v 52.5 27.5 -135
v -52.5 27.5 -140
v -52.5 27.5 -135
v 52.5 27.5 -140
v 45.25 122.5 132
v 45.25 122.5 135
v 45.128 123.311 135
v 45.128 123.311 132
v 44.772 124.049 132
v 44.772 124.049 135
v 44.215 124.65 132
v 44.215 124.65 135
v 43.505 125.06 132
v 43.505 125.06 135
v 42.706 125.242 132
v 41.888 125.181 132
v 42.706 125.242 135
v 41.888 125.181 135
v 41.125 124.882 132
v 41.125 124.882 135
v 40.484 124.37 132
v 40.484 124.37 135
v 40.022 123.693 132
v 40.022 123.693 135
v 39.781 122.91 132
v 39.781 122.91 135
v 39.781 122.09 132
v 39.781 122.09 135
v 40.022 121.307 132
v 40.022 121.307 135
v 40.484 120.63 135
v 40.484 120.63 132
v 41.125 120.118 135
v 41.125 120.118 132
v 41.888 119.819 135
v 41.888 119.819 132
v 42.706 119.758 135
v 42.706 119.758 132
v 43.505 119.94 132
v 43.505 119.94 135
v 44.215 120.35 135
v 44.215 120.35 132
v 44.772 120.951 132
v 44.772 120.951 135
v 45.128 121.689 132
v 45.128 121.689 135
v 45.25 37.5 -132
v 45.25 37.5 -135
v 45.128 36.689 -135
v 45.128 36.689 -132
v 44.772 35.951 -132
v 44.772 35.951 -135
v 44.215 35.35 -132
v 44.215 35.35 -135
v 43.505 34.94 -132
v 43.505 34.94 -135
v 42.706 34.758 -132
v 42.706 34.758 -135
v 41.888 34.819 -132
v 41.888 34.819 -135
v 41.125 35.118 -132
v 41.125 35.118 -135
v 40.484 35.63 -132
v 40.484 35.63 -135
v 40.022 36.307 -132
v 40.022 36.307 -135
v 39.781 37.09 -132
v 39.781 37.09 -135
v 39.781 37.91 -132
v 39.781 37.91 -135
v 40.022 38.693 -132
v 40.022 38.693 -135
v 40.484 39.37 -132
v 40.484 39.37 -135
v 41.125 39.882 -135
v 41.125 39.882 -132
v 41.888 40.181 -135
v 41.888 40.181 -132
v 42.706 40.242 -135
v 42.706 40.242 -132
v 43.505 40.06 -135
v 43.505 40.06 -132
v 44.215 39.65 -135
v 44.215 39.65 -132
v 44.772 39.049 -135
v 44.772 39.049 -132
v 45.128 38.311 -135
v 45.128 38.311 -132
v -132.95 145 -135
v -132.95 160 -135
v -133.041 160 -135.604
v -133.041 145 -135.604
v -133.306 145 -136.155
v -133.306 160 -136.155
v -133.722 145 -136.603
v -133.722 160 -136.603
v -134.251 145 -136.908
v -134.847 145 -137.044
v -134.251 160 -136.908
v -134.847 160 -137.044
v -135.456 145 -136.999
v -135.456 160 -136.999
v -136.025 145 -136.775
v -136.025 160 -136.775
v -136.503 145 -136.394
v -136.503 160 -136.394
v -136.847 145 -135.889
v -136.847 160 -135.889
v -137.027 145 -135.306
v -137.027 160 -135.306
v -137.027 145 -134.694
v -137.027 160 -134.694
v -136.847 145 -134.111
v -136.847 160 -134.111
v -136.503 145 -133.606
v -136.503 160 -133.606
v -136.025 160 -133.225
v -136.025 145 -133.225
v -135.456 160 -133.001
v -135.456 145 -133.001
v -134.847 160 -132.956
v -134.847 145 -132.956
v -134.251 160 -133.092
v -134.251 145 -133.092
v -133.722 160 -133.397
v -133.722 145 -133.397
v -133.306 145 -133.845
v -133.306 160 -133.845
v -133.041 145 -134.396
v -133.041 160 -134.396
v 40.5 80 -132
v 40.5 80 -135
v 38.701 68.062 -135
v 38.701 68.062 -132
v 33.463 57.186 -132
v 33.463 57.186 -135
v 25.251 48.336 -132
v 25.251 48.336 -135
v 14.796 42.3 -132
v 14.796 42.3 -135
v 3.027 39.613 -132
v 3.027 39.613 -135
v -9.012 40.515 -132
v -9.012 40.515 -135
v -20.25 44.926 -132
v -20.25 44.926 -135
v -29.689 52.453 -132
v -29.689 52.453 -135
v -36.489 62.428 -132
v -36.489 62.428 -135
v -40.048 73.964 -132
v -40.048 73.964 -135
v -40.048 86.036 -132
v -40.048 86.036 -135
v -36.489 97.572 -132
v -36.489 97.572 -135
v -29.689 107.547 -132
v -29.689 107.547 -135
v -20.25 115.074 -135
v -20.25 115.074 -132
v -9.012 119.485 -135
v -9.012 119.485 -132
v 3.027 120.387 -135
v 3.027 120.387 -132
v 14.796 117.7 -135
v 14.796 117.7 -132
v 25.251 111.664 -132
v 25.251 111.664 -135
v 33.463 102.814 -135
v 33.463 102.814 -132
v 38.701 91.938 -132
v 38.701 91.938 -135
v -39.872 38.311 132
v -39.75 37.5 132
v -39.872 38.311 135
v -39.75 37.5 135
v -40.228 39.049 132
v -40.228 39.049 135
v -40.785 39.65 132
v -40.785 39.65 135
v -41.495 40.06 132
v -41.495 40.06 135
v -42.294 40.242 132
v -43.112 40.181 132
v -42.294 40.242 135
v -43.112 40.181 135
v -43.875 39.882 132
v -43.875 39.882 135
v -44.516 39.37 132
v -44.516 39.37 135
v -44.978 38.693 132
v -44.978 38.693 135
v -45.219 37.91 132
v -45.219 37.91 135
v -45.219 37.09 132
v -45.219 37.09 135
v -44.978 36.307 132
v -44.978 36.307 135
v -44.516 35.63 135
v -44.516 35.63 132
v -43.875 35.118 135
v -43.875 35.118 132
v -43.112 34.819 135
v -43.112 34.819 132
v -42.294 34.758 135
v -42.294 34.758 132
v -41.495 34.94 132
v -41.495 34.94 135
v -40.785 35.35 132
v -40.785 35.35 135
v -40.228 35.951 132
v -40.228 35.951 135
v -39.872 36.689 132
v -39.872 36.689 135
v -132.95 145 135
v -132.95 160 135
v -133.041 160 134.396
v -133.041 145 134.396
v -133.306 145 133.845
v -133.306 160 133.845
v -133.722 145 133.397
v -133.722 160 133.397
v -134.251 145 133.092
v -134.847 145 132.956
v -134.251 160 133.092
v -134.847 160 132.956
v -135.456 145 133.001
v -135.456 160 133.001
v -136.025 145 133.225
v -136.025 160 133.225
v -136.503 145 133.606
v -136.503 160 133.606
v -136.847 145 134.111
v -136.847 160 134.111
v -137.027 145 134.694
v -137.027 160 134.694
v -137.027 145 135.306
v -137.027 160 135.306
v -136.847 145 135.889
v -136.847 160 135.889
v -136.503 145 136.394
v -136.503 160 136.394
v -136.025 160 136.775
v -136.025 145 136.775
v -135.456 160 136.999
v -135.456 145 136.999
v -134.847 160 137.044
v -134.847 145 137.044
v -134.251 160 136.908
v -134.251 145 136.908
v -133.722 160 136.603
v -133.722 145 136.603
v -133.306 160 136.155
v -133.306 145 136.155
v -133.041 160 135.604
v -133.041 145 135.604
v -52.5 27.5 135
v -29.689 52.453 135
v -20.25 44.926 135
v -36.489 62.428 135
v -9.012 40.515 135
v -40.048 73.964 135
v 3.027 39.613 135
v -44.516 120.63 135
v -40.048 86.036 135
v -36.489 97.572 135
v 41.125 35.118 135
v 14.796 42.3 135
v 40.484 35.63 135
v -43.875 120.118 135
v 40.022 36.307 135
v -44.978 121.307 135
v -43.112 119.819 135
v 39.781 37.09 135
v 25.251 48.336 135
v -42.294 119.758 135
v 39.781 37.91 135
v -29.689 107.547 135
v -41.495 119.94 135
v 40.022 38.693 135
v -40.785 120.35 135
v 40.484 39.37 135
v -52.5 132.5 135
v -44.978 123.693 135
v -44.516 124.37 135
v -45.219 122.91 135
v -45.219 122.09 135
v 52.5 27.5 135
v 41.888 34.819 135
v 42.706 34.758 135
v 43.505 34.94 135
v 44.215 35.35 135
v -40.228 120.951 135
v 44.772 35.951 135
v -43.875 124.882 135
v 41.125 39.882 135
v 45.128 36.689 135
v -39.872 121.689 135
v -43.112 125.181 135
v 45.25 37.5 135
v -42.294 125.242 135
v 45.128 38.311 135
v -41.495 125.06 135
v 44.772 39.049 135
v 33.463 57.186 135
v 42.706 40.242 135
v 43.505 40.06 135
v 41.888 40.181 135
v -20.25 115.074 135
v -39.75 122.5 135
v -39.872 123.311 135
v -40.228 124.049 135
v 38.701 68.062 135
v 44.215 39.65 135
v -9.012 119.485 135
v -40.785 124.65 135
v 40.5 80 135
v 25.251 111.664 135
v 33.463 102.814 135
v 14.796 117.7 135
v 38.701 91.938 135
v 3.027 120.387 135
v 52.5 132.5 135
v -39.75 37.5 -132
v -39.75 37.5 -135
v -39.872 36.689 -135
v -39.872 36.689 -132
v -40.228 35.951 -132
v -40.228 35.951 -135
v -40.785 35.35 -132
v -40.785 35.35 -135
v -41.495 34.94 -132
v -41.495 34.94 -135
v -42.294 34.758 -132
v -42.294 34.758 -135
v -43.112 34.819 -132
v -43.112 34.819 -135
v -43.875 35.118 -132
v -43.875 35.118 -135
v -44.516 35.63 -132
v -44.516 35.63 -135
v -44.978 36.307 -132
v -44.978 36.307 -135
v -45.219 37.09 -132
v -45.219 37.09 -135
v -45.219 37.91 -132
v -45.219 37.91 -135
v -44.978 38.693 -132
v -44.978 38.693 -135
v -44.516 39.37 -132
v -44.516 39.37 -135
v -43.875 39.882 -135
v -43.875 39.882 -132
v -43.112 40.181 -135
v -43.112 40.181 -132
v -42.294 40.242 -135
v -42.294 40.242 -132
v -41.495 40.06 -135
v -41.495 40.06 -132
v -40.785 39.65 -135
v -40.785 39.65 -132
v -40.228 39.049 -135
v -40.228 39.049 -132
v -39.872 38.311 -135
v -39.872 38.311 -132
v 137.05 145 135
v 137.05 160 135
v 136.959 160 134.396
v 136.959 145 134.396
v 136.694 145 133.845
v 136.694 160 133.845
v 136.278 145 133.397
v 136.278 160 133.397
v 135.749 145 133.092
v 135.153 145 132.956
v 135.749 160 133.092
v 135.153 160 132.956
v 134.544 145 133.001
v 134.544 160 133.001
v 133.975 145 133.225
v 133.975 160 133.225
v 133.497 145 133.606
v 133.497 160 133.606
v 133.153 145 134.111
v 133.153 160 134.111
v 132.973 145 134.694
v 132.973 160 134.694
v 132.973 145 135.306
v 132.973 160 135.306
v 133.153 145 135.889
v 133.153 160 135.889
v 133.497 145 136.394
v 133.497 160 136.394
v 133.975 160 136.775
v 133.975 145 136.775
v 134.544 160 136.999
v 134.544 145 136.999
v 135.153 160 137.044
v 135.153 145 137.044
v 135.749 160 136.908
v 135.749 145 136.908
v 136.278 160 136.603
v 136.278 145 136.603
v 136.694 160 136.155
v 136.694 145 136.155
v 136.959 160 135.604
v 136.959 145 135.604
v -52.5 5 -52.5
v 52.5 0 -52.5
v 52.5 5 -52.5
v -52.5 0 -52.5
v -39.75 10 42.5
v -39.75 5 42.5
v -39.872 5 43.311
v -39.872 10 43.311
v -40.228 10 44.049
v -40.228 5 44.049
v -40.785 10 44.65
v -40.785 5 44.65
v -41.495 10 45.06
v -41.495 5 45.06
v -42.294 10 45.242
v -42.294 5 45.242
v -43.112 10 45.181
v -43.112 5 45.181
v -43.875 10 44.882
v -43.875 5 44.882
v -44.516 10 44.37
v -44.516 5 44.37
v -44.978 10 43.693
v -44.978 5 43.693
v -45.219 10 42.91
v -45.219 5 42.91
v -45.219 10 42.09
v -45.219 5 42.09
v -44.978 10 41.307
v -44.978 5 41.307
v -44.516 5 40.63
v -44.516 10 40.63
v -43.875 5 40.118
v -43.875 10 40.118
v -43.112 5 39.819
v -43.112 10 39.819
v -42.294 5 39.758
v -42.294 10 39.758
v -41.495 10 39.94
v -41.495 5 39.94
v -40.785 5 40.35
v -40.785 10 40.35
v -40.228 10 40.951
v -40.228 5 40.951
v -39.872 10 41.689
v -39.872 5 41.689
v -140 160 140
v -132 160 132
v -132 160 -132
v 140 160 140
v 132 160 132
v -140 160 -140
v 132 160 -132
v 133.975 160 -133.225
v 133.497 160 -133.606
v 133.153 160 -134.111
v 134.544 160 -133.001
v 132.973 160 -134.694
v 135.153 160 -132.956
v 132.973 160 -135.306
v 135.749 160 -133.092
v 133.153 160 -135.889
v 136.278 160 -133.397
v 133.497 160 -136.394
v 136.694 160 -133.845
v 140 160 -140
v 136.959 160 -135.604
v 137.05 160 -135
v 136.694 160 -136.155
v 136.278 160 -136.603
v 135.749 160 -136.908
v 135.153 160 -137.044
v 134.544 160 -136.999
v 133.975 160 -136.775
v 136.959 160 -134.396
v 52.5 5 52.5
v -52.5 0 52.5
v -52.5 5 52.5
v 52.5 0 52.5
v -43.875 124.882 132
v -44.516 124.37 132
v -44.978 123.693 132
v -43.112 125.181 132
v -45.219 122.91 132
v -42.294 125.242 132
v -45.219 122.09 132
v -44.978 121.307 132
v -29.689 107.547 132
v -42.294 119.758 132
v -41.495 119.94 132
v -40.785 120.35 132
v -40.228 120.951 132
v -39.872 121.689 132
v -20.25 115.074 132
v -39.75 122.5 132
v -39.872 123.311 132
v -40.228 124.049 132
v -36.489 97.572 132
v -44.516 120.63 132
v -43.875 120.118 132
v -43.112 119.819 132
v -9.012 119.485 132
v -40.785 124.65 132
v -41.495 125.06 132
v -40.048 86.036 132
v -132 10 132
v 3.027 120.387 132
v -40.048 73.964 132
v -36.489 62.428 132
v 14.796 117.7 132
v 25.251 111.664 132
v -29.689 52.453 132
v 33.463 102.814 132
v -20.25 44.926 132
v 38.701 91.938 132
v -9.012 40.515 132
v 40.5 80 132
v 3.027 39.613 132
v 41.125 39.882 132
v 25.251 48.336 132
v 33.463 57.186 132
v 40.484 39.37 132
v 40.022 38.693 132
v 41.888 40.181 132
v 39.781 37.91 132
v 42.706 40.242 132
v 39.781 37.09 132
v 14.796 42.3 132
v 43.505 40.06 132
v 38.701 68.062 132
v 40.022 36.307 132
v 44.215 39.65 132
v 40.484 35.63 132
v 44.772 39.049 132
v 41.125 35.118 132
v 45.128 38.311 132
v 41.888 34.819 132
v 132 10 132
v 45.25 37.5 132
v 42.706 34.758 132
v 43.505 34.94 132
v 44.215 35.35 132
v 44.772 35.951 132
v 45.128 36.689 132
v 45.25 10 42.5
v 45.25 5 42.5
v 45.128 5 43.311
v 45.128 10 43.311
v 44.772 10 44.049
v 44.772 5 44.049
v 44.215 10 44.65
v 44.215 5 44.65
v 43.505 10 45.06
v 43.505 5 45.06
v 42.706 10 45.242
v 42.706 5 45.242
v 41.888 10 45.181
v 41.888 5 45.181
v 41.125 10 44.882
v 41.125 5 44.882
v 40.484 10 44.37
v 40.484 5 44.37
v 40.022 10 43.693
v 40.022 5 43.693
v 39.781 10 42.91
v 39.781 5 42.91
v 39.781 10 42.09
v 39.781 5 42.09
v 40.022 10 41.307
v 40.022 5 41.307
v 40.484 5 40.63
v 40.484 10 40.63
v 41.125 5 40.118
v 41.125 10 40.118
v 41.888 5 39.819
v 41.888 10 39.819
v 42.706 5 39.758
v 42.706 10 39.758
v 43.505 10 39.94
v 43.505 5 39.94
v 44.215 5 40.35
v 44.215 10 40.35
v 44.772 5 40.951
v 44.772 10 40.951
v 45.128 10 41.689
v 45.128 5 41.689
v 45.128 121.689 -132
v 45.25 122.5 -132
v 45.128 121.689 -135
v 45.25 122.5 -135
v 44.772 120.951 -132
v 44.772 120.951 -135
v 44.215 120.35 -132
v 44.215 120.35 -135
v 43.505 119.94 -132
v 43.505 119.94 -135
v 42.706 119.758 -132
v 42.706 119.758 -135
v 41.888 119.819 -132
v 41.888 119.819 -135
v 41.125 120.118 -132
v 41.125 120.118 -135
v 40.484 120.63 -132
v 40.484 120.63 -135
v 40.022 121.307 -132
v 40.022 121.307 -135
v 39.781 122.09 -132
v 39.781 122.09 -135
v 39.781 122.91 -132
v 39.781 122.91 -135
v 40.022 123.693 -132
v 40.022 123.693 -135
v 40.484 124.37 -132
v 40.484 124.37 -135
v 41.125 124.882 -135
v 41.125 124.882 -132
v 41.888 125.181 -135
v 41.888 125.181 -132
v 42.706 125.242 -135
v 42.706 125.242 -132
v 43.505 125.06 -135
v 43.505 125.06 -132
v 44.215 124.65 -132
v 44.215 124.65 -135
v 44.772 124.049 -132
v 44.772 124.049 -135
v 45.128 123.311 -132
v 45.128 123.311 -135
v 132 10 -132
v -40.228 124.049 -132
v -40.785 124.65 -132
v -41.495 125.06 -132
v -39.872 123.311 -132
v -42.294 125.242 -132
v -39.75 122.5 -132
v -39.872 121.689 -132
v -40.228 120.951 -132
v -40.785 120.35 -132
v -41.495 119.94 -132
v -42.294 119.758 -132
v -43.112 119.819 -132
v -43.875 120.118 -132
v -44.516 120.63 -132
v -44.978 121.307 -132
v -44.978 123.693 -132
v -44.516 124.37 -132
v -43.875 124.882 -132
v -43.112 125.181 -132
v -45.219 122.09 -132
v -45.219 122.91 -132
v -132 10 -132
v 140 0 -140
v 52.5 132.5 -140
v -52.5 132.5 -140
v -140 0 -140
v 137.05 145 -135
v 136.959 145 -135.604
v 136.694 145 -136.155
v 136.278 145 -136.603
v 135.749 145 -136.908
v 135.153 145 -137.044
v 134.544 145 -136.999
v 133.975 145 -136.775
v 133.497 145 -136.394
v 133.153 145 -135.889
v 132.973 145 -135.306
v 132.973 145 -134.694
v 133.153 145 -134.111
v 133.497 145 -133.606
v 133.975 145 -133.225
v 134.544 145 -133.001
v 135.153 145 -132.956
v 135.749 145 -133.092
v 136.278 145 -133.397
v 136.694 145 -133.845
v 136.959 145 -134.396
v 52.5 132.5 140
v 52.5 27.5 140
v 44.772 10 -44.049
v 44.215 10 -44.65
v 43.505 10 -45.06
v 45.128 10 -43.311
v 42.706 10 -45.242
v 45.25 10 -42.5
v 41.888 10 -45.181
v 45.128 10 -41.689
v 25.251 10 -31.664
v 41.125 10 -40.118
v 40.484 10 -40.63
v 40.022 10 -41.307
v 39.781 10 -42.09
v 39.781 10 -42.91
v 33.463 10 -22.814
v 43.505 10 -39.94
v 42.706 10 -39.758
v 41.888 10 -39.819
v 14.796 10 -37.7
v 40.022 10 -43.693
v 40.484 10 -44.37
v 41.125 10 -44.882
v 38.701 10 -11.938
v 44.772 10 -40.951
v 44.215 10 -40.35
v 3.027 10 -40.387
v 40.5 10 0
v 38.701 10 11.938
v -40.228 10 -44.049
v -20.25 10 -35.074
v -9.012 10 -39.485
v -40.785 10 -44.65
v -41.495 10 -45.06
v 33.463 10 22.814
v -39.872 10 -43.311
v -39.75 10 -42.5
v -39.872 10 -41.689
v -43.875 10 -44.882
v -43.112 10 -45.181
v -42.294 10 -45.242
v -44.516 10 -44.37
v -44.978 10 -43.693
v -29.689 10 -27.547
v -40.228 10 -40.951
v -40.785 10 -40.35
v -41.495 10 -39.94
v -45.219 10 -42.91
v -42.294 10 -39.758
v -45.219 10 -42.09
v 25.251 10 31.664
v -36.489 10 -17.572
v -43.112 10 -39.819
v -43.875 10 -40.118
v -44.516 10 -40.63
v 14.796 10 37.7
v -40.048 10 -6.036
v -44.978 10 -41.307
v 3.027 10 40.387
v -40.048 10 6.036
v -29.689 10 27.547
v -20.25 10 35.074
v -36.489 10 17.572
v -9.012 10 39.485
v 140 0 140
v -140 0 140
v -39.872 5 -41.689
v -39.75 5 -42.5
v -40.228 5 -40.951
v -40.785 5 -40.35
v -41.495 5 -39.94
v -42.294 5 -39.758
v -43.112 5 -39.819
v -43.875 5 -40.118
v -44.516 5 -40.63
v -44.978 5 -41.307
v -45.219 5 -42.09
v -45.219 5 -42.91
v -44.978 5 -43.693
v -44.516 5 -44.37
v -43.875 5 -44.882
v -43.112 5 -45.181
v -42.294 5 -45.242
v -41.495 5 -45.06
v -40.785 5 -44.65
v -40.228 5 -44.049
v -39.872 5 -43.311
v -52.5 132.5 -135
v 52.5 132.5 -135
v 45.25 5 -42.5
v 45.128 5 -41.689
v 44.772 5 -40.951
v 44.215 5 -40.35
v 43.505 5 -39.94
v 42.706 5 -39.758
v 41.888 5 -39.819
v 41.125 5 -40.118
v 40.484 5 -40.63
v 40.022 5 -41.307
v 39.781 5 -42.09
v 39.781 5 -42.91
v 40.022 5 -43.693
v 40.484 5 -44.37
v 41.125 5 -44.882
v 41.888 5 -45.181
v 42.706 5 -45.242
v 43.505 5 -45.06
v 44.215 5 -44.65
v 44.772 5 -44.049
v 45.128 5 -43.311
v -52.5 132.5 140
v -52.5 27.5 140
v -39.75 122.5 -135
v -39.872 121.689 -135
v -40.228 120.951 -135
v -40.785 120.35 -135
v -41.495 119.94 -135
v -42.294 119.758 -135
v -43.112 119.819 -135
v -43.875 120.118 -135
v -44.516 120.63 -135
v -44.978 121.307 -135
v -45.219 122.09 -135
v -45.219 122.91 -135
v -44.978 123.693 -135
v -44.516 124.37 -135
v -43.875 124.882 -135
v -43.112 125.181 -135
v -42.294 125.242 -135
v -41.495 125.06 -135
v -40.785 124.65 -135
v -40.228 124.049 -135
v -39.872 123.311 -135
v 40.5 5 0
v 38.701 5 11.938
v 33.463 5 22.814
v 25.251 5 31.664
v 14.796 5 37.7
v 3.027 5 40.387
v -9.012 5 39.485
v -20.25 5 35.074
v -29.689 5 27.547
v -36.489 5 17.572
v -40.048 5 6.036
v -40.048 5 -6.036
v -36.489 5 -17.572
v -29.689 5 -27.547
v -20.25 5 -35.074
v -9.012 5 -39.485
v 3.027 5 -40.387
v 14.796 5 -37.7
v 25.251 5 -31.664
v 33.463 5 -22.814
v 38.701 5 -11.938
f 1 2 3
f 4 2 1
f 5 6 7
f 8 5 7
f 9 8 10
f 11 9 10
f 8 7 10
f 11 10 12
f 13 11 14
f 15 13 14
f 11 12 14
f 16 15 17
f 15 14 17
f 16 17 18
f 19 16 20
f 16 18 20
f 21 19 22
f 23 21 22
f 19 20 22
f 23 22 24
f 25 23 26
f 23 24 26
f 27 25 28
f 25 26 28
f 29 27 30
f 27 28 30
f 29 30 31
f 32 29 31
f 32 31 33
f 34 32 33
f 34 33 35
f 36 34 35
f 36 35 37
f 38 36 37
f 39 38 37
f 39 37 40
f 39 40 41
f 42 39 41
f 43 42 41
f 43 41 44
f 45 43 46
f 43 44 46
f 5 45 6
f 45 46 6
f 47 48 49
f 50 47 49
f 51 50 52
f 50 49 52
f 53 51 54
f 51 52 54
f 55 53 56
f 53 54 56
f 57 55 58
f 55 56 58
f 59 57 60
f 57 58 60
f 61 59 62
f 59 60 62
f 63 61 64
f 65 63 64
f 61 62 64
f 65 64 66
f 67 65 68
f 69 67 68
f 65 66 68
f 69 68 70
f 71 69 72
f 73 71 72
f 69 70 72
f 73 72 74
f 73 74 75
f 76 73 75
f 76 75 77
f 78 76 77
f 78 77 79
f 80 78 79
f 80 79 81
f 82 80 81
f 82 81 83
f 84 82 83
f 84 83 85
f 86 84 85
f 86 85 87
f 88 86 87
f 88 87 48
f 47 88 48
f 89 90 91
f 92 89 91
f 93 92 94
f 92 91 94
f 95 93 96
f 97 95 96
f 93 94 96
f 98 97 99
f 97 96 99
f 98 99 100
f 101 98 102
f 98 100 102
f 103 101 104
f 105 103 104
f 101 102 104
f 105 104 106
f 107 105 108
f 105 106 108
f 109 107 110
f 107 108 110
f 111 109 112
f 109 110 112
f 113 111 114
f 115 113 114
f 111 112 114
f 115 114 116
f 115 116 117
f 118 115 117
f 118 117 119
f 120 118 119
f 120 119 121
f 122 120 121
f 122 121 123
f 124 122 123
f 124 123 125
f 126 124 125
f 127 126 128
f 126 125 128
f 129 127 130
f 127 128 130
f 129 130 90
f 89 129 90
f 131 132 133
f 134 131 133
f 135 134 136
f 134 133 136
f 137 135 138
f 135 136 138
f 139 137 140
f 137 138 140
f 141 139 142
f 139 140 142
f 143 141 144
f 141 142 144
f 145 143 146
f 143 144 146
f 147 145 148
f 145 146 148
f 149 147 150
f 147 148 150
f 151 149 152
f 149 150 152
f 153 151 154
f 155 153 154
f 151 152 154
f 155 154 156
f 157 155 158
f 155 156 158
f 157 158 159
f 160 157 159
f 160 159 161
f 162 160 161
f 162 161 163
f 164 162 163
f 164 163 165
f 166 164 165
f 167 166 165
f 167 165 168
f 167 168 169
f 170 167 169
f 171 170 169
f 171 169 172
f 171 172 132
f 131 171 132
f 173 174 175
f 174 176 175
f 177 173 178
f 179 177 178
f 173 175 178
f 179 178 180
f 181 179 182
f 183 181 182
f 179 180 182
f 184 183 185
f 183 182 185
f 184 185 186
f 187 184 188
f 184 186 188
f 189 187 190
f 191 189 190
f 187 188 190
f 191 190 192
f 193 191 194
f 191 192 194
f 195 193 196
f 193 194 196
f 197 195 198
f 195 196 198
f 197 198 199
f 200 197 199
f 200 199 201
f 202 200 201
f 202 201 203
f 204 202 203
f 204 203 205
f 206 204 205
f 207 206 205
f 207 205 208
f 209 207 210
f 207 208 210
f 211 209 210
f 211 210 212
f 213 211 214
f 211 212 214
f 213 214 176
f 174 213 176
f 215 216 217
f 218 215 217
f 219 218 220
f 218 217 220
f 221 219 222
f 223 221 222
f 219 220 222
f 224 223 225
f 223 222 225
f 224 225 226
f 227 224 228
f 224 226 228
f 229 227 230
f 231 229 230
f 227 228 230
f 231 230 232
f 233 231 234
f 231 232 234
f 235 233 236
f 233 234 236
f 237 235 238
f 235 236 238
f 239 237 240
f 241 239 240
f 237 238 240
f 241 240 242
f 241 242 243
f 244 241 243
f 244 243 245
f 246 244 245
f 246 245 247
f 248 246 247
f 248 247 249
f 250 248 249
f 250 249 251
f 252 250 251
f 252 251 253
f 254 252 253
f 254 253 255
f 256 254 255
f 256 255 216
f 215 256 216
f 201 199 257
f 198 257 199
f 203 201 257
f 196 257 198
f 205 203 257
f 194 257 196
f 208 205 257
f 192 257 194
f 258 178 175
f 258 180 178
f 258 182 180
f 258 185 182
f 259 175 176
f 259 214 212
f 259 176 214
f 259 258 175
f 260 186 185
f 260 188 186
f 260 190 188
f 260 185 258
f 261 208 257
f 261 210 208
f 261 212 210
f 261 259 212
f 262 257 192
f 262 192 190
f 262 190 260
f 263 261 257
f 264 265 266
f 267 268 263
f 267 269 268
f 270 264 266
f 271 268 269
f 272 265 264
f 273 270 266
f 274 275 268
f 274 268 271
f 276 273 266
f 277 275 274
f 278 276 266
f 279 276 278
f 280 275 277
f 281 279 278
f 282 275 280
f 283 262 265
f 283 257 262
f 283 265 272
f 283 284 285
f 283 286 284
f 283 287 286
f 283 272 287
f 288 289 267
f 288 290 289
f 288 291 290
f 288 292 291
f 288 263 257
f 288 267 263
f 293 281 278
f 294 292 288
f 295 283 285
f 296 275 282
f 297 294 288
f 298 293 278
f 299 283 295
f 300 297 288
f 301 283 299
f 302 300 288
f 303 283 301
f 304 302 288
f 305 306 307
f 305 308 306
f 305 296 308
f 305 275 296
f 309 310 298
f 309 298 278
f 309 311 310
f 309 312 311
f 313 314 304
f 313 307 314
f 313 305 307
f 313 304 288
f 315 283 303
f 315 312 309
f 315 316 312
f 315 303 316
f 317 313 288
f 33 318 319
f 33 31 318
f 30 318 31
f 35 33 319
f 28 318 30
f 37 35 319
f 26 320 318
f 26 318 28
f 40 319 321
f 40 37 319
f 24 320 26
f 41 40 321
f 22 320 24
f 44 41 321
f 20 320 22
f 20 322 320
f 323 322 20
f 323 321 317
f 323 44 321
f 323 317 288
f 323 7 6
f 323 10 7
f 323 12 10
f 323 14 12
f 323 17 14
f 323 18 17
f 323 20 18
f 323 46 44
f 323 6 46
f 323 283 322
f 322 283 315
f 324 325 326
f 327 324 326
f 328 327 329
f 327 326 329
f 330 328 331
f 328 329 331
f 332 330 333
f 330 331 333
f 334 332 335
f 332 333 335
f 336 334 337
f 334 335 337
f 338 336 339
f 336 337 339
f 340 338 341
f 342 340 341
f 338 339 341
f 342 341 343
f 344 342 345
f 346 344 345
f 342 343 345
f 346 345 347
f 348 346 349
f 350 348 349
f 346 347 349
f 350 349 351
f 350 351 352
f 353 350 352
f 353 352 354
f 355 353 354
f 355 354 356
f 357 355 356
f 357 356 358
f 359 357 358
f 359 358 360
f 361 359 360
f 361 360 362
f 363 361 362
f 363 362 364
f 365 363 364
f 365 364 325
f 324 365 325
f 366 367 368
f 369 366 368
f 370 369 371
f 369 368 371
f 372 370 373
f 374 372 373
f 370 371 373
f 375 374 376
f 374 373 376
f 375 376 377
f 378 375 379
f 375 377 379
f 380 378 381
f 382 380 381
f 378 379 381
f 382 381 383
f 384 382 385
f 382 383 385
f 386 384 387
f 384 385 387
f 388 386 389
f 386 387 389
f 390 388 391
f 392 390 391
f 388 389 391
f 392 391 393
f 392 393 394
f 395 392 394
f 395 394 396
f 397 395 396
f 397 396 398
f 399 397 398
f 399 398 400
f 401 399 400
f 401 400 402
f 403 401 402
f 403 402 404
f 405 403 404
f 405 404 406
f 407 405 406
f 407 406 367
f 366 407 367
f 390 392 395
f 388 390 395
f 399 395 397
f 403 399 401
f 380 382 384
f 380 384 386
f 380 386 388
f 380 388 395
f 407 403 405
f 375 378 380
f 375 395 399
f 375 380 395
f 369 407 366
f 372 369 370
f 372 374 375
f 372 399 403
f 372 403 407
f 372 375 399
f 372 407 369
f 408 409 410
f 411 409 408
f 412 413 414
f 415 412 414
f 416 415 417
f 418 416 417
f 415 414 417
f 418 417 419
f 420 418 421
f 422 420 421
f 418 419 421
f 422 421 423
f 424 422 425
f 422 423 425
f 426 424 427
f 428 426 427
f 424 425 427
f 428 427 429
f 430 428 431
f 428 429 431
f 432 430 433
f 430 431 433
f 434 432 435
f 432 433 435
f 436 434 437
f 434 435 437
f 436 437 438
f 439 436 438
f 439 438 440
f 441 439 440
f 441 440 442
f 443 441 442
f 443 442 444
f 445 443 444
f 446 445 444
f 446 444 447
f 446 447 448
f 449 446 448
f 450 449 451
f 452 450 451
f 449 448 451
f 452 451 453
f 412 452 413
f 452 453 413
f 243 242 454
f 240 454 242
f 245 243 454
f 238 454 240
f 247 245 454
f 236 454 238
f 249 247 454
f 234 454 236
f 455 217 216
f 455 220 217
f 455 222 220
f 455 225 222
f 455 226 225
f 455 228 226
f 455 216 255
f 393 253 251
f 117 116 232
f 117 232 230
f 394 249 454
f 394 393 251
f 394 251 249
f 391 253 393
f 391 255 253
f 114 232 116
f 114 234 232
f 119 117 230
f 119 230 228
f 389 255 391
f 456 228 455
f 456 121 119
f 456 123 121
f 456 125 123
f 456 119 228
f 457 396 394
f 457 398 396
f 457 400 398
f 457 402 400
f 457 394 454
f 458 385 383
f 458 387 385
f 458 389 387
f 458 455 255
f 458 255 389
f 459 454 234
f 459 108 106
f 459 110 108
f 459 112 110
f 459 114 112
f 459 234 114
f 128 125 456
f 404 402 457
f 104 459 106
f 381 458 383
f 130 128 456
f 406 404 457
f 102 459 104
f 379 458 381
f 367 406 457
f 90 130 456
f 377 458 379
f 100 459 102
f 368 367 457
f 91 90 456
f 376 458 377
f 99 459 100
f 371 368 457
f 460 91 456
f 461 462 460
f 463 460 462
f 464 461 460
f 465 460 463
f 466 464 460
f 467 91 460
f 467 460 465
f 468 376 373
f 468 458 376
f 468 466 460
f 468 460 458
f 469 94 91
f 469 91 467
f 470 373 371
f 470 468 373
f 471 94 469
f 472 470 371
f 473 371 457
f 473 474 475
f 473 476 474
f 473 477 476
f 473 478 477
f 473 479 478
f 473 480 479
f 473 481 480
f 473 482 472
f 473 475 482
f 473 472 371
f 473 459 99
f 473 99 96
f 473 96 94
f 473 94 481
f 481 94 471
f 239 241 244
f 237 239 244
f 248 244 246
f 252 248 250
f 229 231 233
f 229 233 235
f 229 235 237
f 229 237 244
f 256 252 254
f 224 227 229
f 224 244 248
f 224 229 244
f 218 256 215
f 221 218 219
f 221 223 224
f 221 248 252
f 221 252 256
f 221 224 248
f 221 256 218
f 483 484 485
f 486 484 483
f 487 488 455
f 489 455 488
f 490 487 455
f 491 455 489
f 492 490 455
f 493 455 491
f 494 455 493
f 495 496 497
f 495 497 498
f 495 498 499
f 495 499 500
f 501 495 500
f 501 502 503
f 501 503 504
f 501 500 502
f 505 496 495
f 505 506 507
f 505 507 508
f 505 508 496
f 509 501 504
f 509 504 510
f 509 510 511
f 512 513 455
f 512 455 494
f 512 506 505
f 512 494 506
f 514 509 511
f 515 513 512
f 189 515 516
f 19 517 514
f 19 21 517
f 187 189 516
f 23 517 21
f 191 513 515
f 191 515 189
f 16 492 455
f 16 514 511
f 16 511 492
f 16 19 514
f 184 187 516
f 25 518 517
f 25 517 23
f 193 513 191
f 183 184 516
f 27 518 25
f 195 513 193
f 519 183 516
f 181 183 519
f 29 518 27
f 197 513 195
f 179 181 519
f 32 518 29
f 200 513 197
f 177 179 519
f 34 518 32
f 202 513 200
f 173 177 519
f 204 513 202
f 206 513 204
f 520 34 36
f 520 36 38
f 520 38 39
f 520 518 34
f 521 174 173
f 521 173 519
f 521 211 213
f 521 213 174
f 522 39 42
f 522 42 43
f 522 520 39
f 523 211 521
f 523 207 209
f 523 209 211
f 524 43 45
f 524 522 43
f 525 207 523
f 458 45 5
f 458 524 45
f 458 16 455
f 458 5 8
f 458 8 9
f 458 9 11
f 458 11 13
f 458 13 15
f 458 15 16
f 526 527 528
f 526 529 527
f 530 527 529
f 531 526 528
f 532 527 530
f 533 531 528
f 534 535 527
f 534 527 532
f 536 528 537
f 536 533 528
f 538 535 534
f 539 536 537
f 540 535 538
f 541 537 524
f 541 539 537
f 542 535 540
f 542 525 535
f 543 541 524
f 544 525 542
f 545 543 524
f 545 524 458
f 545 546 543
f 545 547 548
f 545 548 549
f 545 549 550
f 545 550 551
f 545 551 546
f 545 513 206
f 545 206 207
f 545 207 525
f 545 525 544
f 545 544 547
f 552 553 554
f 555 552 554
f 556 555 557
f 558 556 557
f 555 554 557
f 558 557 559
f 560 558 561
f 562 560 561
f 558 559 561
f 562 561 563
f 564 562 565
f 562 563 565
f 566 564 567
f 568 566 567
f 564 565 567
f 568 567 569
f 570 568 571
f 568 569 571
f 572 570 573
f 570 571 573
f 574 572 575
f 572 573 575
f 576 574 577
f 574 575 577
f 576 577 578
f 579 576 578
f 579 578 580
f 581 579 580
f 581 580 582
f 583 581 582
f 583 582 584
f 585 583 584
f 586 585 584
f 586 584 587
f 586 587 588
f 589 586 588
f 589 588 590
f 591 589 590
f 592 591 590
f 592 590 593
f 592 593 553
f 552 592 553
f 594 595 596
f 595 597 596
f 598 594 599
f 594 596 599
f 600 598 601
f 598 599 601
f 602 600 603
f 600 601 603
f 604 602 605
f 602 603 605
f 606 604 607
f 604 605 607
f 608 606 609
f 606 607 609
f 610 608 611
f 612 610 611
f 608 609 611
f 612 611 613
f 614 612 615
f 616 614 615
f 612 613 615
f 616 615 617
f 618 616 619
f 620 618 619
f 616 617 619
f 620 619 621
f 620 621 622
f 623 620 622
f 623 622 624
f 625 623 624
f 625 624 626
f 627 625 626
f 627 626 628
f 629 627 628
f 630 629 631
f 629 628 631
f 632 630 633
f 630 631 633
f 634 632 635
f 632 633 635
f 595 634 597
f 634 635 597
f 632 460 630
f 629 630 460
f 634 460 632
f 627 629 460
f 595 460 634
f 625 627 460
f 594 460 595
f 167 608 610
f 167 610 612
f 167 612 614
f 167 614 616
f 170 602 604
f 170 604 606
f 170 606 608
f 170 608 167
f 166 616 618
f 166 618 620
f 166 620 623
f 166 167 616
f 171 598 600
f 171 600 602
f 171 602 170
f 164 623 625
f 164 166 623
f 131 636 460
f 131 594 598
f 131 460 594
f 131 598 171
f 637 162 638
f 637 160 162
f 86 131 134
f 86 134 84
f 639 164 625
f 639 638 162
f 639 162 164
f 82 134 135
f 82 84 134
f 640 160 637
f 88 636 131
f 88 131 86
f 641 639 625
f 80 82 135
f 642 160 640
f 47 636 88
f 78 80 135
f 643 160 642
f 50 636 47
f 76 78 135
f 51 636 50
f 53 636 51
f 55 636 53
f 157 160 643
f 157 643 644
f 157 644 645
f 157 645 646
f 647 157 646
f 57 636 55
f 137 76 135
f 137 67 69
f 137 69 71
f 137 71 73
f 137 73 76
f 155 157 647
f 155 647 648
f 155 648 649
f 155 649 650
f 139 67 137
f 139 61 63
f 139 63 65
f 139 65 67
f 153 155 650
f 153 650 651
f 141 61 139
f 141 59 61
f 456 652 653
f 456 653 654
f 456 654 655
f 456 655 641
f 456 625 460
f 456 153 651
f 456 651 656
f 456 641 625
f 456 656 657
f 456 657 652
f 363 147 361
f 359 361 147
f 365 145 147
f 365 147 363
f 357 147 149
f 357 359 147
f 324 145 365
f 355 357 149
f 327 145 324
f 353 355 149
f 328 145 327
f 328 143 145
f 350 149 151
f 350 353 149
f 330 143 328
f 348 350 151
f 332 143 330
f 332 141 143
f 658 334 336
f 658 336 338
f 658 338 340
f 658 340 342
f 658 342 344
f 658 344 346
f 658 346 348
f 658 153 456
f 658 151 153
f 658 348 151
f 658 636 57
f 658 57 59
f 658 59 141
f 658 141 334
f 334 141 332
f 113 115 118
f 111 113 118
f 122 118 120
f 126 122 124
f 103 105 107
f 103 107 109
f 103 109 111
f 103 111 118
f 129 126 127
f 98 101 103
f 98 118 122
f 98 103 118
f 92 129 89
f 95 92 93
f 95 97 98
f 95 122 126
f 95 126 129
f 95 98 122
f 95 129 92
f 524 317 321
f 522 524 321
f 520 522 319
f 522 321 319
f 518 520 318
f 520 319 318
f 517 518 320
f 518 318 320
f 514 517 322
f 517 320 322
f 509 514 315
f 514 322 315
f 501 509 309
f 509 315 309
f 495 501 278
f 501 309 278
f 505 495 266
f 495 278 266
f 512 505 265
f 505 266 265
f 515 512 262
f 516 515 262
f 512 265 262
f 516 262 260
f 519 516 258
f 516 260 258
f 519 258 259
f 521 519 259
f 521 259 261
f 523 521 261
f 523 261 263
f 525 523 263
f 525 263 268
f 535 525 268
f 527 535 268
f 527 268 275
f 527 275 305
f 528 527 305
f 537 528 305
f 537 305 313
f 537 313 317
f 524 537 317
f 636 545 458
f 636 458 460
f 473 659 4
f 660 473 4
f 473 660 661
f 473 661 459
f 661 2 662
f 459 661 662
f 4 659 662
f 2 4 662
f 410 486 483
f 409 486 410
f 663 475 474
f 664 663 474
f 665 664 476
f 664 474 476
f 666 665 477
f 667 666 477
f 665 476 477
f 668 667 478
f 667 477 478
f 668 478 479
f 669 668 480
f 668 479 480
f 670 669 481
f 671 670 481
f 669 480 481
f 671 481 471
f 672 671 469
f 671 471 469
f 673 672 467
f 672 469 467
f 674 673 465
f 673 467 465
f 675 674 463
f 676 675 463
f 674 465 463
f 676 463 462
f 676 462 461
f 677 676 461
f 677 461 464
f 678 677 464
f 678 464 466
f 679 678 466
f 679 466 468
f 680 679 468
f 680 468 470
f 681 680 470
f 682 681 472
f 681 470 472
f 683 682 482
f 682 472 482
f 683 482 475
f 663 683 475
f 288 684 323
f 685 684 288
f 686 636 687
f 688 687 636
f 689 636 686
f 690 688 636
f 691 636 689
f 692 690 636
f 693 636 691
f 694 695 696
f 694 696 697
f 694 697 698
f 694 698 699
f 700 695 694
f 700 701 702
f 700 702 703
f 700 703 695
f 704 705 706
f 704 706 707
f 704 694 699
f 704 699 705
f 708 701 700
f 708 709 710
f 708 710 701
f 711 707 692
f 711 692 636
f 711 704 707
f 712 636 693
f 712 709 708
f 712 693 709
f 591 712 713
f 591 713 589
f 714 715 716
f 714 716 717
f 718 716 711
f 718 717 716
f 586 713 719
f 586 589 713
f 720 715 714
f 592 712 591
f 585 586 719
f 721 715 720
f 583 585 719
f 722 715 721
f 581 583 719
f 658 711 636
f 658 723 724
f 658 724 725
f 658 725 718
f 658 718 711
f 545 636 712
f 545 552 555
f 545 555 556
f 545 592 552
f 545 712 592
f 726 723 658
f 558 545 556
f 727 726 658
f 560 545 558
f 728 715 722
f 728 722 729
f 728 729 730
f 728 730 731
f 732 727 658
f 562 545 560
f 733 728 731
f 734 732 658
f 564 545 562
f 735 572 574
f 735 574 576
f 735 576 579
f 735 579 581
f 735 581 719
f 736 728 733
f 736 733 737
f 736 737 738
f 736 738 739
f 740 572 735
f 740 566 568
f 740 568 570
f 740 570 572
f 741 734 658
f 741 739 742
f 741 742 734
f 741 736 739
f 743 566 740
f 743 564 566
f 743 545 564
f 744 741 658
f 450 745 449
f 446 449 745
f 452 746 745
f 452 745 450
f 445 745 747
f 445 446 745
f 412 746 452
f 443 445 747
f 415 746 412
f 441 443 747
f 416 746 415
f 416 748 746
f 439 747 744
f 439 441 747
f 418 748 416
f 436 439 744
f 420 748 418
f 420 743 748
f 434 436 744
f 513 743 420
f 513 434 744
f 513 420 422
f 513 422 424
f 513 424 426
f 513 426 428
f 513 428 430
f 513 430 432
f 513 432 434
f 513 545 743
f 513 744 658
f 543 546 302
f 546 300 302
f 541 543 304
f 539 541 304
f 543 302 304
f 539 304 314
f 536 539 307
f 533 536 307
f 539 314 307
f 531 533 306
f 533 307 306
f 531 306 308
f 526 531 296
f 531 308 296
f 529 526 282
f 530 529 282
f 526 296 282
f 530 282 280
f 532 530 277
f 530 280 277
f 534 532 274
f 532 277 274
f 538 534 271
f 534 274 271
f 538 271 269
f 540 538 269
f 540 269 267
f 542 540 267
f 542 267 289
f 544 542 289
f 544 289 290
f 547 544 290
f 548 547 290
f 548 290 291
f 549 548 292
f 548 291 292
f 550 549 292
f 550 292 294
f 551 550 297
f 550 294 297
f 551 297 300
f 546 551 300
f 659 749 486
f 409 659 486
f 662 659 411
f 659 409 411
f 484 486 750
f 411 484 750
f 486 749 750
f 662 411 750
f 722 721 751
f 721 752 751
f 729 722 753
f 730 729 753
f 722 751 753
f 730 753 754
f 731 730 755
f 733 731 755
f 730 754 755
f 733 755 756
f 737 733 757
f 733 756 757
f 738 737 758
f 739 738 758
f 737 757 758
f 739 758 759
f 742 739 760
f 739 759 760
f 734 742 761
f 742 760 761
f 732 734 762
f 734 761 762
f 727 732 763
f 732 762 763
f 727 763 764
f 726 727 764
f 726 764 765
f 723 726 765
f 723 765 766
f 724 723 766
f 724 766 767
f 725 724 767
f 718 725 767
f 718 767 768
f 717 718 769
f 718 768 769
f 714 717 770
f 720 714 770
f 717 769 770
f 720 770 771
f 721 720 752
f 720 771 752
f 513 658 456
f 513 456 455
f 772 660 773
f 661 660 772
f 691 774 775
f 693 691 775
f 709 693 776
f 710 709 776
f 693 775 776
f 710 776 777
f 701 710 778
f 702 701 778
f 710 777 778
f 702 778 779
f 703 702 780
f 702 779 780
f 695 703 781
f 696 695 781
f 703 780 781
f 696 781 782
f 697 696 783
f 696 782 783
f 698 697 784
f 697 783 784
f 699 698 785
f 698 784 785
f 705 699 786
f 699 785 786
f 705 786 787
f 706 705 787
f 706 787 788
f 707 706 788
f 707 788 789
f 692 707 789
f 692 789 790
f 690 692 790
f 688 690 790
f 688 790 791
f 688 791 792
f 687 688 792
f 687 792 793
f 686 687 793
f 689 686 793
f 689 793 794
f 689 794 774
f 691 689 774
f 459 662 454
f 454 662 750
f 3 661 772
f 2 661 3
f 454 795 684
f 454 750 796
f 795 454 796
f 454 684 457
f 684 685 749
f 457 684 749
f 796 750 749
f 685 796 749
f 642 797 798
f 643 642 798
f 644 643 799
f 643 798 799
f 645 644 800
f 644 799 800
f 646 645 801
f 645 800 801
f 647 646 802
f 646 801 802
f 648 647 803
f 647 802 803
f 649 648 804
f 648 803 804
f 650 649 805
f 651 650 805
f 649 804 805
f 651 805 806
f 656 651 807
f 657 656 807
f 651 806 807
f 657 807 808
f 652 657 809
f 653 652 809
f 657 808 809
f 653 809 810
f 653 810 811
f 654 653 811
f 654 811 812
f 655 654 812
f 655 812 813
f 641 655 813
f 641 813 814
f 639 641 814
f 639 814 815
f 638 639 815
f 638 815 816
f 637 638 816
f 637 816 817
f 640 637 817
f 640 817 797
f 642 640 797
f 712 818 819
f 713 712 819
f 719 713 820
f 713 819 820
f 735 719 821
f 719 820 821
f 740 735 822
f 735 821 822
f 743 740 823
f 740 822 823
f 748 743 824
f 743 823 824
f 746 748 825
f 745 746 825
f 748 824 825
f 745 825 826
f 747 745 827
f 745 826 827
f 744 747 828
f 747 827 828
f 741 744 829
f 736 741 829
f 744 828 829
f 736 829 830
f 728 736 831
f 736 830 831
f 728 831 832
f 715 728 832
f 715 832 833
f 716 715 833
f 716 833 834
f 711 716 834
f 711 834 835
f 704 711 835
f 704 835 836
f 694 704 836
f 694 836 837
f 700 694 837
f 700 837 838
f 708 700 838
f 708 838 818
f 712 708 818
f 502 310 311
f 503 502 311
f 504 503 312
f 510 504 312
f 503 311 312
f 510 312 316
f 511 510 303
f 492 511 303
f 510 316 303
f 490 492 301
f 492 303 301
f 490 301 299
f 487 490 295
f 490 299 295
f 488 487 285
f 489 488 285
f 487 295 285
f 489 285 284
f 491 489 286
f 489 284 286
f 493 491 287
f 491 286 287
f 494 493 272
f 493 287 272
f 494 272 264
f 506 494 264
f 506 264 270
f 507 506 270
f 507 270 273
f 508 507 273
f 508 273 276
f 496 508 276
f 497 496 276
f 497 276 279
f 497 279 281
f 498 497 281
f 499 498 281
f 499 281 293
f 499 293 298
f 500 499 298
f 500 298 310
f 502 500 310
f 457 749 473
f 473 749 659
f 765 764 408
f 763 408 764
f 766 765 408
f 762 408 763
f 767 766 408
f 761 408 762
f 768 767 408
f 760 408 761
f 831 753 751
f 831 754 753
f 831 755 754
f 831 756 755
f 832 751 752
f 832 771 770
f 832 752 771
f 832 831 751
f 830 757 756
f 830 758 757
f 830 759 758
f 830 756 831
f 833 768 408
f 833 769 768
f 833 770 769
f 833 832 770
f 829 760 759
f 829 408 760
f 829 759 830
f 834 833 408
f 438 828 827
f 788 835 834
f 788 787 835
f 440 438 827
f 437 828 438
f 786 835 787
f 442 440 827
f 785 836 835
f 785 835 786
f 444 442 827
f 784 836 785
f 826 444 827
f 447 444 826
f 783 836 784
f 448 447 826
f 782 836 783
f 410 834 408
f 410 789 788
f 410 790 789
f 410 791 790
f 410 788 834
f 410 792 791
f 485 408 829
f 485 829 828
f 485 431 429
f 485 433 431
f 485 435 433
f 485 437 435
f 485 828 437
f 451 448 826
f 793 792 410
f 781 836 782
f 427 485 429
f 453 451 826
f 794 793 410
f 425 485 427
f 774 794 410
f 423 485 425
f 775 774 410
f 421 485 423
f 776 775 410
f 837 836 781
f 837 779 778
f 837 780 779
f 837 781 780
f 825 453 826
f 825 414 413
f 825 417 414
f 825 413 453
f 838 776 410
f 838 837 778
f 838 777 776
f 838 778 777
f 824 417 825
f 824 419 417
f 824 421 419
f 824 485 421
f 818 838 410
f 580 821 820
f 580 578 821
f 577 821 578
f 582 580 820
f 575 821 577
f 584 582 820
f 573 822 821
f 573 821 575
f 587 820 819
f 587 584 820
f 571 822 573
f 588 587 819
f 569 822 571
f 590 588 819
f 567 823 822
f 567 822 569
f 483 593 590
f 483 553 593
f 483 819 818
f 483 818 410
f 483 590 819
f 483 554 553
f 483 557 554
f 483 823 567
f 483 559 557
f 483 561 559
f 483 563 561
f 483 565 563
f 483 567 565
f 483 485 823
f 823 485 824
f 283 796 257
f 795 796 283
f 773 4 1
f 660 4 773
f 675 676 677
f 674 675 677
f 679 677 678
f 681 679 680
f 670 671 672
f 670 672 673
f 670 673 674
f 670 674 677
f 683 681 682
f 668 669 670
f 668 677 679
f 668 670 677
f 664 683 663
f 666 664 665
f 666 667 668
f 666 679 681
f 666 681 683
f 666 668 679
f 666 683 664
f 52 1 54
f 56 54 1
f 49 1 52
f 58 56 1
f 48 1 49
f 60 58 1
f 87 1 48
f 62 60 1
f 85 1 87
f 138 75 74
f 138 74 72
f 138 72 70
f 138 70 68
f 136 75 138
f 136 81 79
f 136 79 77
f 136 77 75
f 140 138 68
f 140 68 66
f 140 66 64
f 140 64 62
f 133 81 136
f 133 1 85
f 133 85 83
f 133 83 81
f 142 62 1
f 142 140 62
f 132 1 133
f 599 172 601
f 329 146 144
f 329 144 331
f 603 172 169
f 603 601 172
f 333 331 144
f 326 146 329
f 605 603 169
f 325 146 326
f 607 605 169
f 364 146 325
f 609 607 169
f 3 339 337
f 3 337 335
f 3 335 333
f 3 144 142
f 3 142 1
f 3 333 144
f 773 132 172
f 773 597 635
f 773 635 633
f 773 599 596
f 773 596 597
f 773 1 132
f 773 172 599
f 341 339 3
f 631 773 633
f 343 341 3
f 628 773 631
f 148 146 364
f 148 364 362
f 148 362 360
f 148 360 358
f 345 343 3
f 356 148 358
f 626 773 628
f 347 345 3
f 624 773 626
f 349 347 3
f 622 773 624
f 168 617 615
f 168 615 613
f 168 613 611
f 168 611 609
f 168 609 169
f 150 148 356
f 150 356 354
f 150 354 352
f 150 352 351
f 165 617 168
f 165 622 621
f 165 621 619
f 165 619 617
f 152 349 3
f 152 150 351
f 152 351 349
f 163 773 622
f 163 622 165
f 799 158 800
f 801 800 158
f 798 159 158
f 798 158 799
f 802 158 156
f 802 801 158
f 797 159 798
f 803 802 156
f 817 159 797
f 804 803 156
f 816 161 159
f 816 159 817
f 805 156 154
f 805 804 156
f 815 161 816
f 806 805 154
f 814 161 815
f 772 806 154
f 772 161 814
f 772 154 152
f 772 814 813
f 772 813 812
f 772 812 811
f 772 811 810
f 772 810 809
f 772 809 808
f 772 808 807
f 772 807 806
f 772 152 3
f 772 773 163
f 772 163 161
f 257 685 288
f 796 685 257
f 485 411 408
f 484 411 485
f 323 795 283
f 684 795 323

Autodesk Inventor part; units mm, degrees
ref_plane "YZ Plane" through (0, 0, 0) normal (1, 0, 0) x (0, 1, 0)
ref_plane "XZ Plane" through (0, 0, 0) normal (0, 1, 0) x (-1, 0, 0)
ref_plane "XY Plane" through (0, 0, 0) normal (0, 0, 1) x (1, 0, 0)
sketch "Sketch1" plane through (0, 0, 0) normal (0, 1, 0) x (-1, 0, 0)
  line L0 (140, 140) -> (-140, 140)
  line L1 (-140, 140) -> (-140, -140)
  line L2 (-140, -140) -> (140, -140)
  line L3 (140, -140) -> (140, 140)
  point P0 (0, 0)
  point P1 (140, 0)
  point P2 (0, -140)
  dimension "d0" = 280
  dimension "d1" = 280
extrude "Extrusion1" add sketch "Sketch1" along normal blind 10
sketch "Sketch2" plane through (0, 10, 0) normal (0, 1, 0) x (1, 0, 0)
  line L0 (-140, -140) -> (140, -140)
  line L1 (140, -140) -> (140, 140)
  line L2 (140, 140) -> (-140, 140)
  line L3 (-140, 140) -> (-140, -140)
  line L4 (-132, -132) -> (132, -132)
  line L5 (132, -132) -> (132, 132)
  line L6 (132, 132) -> (-132, 132)
  line L7 (-132, 132) -> (-132, -132)
  point P0 (0, 0)
  dimension "d4" = 8
extrude "Extrusion2" add sketch "Sketch2" along normal blind 150
sketch "Sketch3" plane through (0, 160, 0) normal (0, 1, 0) x (1, 0, 0)
  circle A0 centre (-135, 135) radius 2.05
  circle A1 centre (135, 135) radius 2.05
  circle A2 centre (135, -135) radius 2.05
  circle A3 centre (-135, -135) radius 2.05
  line L0 (140, -140) -> (140, 140) projected
  line L1 (-140, -140) -> (140, -140) projected
  line L2 (140, 140) -> (-140, 140) projected
  line L3 (-140, 140) -> (-140, -140) projected
  point P0 (0, 0)
  dimension "d8" = 4.1
  dimension "d12" = 5
  dimension "d16" = 5
  dimension "d18" = 4.1
  dimension "d19" = 5
  dimension "d20" = 5
  dimension "d21" = 4.1
  dimension "d22" = 5
  dimension "d23" = 5
  dimension "d24" = 5
  dimension "d25" = 5
  dimension "d26" = 4.1
extrude "Extrusion3" cut sketch "Sketch3" against normal blind 15 contours A0 | A1 | A2 | A3
sketch "Sketch4" plane through (140, 0, 140) normal (1, 0, 0) x (0, 0, -1)
  line L0 (90, 130) -> (190, 130)
  line L1 (190, 130) -> (190, 30)
  line L2 (190, 30) -> (90, 30)
  line L3 (90, 30) -> (90, 130)
  line L4 (0, 160) -> (280, 160) projected
  line L5 (280, 0) -> (280, 160) projected
  point P0 (140, 0)
  point P1 (140, 130)
  point P2 (140, 160)
  point P3 (190, 80)
  point P4 (280, 80)
  dimension "d29" = 100
  dimension "d30" = 100
sketch "Sketch5" plane through (-140, 0, 140) normal (0, 0, 1) x (1, 0, 0)
  line L0 (280, 0) -> (280, 160) projected
  line L1 (0, 160) -> (280, 160) projected
  circle A0 centre (140, 80) radius 40.5
  point P0 (140, 0)
  point P1 (195.958, 80)
  point P2 (280, 80)
  point P3 (140, 107.0458)
  point P4 (140, 160)
  point P5 (280, 80)
  point P6 (140, 160)
  dimension "d81" = 81
extrude "Extrusion4" cut sketch "Sketch5" against normal blind 10
sketch "Sketch6" plane through (-140, 0, 140) normal (0, 0, 1) x (1, 0, 0)
  line L0 (192.5, 27.5) -> (87.5, 27.5)
  line L1 (87.5, 27.5) -> (87.5, 132.5)
  line L2 (87.5, 132.5) -> (192.5, 132.5)
  line L3 (192.5, 132.5) -> (192.5, 27.5)
  line L4 (0, 0) -> (280, 0) projected
  line L5 (0, 0) -> (0, 160) projected
  circle A0 centre (182.5, 37.5) radius 2.75
  circle A1 centre (182.5, 122.5) radius 2.75
  circle A2 centre (97.5, 37.5) radius 2.75
  circle A3 centre (97.5, 122.5) radius 2.75
  line L6 (210, 30) -> (70, 30)
  point P0 (140, 0)
  point P1 (49.5, 158)
  point P2 (180.5, 27)
  point P3 (140, 27.5)
  point P4 (140, 0)
  point P5 (87.5, 80)
  point P6 (0, 80)
  point P7 (60, 80)
  point P8 (140, 30)
  dimension "d108" = 105
  dimension "d109" = 105
  dimension "d112" = 5.5
  dimension "d113" = 10
  dimension "d114" = 10
  dimension "d117" = 85
  dimension "d120" = 85
sketch "Sketch7" plane through (0, 10, 0) normal (0, 1, 0) x (1, 0, 0)
  line L0 (132, 132) -> (132, -132) construction
  line L1 (132, 0) -> (-132, 0) construction
  line L2 (-132, -132) -> (-132, 132) construction
  point P0 (0, 0)
ref_plane "Work Plane1" through (132, 10, 0) normal (0, 0, -1) x (-1, 0, 0)
extrude "Extrusion13" cut sketch "Sketch6" against normal blind 5
mirror "Mirror2" about plane through (132, 10, 0) normal (0, 0, -1) of "Extrusion4"
sketch "Sketch8" plane through (0, 0, 0) normal (0, -1, 0) x (1, 0, 0)
  line L0 (75, -75) -> (-75, -75)
  line L1 (-75, -75) -> (-75, 75)
  line L2 (-75, 75) -> (75, 75)
  line L3 (75, 75) -> (75, -75)
  circle A0 centre (65, -65) radius 2.75
  circle A1 centre (65, 65) radius 2.75
  circle A2 centre (-65, -65) radius 2.75
  circle A3 centre (-65, 65) radius 2.75
  circle A4 centre (0, 0) radius 40.5
  point P0 (-35, 0)
  point P1 (0, -35)
  point P2 (75, 0)
  point P3 (0, -75)
  dimension "d58" = 130
  dimension "d65" = 130
  dimension "d82" = 81
  dimension "d83" = 150
  dimension "d84" = 150
  dimension "d85" = 10
  dimension "d86" = 10
  dimension "d87" = 130
  dimension "d88" = 130
  dimension "d89" = 5.5
  dimension "d90" = 5.5
  dimension "d91" = 5.5
  dimension "d92" = 5.5
extrude "Extrusion9" cut sketch "Sketch8" against normal blind 10 contours A4
sketch "Sketch13" plane through (0, 0, 0) normal (0, -1, 0) x (1, 0, 0)
  line L0 (-52.5, 52.5) -> (52.5, 52.5)
  line L1 (52.5, 52.5) -> (52.5, -52.5)
  line L2 (52.5, -52.5) -> (-52.5, -52.5)
  line L3 (-52.5, -52.5) -> (-52.5, 52.5)
  circle A0 centre (-42.5, 42.5) radius 2.75
  circle A1 centre (-42.5, -42.5) radius 2.75
  circle A2 centre (42.5, -42.5) radius 2.75
  circle A3 centre (42.5, 42.5) radius 2.75
  point P0 (0, 0)
  point P1 (52.5, 0)
  point P2 (0, 52.5)
  dimension "d95" = 105
  dimension "d96" = 105
  dimension "d97" = 5.5
  dimension "d98" = 10
  dimension "d99" = 10
  dimension "d102" = 360
extrude "Extrusion10" cut sketch "Sketch13" against normal blind 5
sketch "Sketch14" plane through (42.5, 0, 42.5) normal (0, -1, 0) x (1, 0, 0)
  circle A0 centre (0, 0) radius 2.75 projected
  circle A1 centre (0, 0) radius 2.75
  circle A2 centre (0, -85) radius 2.75 projected
  circle A3 centre (0, -85) radius 2.75
  circle A4 centre (-85, -85) radius 2.75 projected
  circle A5 centre (-85, -85) radius 2.75
  circle A6 centre (-85, 0) radius 2.75
  circle A7 centre (-85, 0) radius 2.75 projected
  point P0 (-42.5, -42.5)
extrude "Extrusion11" cut sketch "Sketch14" against normal up to next
sketch "Sketch16" plane through (-42.5, 122.5, 140) normal (0, 0, 1) x (1, 0, 0)
  circle A0 centre (0, 0) radius 2.75
  circle A1 centre (85, 0) radius 2.75
  circle A2 centre (85, 0) radius 2.75 projected
  circle A3 centre (85, -85) radius 2.75
  circle A4 centre (85, -85) radius 2.75 projected
  circle A5 centre (0, -85) radius 2.75
  circle A6 centre (0, -85) radius 2.75 projected
  circle A7 centre (0, 0) radius 2.75 projected
  point P0 (42.5, -122.5)
  dimension "d129" = 5.5
  dimension "d130" = 5.5
  dimension "d131" = 5.5
  dimension "d132" = 5.5
extrude "Extrusion14" cut sketch "Sketch16" against normal blind 10
mirror "Mirror4" about plane through (132, 10, 0) normal (0, 0, -1) of "Extrusion13", "Extrusion14"
properties part number "brain box bottom"
